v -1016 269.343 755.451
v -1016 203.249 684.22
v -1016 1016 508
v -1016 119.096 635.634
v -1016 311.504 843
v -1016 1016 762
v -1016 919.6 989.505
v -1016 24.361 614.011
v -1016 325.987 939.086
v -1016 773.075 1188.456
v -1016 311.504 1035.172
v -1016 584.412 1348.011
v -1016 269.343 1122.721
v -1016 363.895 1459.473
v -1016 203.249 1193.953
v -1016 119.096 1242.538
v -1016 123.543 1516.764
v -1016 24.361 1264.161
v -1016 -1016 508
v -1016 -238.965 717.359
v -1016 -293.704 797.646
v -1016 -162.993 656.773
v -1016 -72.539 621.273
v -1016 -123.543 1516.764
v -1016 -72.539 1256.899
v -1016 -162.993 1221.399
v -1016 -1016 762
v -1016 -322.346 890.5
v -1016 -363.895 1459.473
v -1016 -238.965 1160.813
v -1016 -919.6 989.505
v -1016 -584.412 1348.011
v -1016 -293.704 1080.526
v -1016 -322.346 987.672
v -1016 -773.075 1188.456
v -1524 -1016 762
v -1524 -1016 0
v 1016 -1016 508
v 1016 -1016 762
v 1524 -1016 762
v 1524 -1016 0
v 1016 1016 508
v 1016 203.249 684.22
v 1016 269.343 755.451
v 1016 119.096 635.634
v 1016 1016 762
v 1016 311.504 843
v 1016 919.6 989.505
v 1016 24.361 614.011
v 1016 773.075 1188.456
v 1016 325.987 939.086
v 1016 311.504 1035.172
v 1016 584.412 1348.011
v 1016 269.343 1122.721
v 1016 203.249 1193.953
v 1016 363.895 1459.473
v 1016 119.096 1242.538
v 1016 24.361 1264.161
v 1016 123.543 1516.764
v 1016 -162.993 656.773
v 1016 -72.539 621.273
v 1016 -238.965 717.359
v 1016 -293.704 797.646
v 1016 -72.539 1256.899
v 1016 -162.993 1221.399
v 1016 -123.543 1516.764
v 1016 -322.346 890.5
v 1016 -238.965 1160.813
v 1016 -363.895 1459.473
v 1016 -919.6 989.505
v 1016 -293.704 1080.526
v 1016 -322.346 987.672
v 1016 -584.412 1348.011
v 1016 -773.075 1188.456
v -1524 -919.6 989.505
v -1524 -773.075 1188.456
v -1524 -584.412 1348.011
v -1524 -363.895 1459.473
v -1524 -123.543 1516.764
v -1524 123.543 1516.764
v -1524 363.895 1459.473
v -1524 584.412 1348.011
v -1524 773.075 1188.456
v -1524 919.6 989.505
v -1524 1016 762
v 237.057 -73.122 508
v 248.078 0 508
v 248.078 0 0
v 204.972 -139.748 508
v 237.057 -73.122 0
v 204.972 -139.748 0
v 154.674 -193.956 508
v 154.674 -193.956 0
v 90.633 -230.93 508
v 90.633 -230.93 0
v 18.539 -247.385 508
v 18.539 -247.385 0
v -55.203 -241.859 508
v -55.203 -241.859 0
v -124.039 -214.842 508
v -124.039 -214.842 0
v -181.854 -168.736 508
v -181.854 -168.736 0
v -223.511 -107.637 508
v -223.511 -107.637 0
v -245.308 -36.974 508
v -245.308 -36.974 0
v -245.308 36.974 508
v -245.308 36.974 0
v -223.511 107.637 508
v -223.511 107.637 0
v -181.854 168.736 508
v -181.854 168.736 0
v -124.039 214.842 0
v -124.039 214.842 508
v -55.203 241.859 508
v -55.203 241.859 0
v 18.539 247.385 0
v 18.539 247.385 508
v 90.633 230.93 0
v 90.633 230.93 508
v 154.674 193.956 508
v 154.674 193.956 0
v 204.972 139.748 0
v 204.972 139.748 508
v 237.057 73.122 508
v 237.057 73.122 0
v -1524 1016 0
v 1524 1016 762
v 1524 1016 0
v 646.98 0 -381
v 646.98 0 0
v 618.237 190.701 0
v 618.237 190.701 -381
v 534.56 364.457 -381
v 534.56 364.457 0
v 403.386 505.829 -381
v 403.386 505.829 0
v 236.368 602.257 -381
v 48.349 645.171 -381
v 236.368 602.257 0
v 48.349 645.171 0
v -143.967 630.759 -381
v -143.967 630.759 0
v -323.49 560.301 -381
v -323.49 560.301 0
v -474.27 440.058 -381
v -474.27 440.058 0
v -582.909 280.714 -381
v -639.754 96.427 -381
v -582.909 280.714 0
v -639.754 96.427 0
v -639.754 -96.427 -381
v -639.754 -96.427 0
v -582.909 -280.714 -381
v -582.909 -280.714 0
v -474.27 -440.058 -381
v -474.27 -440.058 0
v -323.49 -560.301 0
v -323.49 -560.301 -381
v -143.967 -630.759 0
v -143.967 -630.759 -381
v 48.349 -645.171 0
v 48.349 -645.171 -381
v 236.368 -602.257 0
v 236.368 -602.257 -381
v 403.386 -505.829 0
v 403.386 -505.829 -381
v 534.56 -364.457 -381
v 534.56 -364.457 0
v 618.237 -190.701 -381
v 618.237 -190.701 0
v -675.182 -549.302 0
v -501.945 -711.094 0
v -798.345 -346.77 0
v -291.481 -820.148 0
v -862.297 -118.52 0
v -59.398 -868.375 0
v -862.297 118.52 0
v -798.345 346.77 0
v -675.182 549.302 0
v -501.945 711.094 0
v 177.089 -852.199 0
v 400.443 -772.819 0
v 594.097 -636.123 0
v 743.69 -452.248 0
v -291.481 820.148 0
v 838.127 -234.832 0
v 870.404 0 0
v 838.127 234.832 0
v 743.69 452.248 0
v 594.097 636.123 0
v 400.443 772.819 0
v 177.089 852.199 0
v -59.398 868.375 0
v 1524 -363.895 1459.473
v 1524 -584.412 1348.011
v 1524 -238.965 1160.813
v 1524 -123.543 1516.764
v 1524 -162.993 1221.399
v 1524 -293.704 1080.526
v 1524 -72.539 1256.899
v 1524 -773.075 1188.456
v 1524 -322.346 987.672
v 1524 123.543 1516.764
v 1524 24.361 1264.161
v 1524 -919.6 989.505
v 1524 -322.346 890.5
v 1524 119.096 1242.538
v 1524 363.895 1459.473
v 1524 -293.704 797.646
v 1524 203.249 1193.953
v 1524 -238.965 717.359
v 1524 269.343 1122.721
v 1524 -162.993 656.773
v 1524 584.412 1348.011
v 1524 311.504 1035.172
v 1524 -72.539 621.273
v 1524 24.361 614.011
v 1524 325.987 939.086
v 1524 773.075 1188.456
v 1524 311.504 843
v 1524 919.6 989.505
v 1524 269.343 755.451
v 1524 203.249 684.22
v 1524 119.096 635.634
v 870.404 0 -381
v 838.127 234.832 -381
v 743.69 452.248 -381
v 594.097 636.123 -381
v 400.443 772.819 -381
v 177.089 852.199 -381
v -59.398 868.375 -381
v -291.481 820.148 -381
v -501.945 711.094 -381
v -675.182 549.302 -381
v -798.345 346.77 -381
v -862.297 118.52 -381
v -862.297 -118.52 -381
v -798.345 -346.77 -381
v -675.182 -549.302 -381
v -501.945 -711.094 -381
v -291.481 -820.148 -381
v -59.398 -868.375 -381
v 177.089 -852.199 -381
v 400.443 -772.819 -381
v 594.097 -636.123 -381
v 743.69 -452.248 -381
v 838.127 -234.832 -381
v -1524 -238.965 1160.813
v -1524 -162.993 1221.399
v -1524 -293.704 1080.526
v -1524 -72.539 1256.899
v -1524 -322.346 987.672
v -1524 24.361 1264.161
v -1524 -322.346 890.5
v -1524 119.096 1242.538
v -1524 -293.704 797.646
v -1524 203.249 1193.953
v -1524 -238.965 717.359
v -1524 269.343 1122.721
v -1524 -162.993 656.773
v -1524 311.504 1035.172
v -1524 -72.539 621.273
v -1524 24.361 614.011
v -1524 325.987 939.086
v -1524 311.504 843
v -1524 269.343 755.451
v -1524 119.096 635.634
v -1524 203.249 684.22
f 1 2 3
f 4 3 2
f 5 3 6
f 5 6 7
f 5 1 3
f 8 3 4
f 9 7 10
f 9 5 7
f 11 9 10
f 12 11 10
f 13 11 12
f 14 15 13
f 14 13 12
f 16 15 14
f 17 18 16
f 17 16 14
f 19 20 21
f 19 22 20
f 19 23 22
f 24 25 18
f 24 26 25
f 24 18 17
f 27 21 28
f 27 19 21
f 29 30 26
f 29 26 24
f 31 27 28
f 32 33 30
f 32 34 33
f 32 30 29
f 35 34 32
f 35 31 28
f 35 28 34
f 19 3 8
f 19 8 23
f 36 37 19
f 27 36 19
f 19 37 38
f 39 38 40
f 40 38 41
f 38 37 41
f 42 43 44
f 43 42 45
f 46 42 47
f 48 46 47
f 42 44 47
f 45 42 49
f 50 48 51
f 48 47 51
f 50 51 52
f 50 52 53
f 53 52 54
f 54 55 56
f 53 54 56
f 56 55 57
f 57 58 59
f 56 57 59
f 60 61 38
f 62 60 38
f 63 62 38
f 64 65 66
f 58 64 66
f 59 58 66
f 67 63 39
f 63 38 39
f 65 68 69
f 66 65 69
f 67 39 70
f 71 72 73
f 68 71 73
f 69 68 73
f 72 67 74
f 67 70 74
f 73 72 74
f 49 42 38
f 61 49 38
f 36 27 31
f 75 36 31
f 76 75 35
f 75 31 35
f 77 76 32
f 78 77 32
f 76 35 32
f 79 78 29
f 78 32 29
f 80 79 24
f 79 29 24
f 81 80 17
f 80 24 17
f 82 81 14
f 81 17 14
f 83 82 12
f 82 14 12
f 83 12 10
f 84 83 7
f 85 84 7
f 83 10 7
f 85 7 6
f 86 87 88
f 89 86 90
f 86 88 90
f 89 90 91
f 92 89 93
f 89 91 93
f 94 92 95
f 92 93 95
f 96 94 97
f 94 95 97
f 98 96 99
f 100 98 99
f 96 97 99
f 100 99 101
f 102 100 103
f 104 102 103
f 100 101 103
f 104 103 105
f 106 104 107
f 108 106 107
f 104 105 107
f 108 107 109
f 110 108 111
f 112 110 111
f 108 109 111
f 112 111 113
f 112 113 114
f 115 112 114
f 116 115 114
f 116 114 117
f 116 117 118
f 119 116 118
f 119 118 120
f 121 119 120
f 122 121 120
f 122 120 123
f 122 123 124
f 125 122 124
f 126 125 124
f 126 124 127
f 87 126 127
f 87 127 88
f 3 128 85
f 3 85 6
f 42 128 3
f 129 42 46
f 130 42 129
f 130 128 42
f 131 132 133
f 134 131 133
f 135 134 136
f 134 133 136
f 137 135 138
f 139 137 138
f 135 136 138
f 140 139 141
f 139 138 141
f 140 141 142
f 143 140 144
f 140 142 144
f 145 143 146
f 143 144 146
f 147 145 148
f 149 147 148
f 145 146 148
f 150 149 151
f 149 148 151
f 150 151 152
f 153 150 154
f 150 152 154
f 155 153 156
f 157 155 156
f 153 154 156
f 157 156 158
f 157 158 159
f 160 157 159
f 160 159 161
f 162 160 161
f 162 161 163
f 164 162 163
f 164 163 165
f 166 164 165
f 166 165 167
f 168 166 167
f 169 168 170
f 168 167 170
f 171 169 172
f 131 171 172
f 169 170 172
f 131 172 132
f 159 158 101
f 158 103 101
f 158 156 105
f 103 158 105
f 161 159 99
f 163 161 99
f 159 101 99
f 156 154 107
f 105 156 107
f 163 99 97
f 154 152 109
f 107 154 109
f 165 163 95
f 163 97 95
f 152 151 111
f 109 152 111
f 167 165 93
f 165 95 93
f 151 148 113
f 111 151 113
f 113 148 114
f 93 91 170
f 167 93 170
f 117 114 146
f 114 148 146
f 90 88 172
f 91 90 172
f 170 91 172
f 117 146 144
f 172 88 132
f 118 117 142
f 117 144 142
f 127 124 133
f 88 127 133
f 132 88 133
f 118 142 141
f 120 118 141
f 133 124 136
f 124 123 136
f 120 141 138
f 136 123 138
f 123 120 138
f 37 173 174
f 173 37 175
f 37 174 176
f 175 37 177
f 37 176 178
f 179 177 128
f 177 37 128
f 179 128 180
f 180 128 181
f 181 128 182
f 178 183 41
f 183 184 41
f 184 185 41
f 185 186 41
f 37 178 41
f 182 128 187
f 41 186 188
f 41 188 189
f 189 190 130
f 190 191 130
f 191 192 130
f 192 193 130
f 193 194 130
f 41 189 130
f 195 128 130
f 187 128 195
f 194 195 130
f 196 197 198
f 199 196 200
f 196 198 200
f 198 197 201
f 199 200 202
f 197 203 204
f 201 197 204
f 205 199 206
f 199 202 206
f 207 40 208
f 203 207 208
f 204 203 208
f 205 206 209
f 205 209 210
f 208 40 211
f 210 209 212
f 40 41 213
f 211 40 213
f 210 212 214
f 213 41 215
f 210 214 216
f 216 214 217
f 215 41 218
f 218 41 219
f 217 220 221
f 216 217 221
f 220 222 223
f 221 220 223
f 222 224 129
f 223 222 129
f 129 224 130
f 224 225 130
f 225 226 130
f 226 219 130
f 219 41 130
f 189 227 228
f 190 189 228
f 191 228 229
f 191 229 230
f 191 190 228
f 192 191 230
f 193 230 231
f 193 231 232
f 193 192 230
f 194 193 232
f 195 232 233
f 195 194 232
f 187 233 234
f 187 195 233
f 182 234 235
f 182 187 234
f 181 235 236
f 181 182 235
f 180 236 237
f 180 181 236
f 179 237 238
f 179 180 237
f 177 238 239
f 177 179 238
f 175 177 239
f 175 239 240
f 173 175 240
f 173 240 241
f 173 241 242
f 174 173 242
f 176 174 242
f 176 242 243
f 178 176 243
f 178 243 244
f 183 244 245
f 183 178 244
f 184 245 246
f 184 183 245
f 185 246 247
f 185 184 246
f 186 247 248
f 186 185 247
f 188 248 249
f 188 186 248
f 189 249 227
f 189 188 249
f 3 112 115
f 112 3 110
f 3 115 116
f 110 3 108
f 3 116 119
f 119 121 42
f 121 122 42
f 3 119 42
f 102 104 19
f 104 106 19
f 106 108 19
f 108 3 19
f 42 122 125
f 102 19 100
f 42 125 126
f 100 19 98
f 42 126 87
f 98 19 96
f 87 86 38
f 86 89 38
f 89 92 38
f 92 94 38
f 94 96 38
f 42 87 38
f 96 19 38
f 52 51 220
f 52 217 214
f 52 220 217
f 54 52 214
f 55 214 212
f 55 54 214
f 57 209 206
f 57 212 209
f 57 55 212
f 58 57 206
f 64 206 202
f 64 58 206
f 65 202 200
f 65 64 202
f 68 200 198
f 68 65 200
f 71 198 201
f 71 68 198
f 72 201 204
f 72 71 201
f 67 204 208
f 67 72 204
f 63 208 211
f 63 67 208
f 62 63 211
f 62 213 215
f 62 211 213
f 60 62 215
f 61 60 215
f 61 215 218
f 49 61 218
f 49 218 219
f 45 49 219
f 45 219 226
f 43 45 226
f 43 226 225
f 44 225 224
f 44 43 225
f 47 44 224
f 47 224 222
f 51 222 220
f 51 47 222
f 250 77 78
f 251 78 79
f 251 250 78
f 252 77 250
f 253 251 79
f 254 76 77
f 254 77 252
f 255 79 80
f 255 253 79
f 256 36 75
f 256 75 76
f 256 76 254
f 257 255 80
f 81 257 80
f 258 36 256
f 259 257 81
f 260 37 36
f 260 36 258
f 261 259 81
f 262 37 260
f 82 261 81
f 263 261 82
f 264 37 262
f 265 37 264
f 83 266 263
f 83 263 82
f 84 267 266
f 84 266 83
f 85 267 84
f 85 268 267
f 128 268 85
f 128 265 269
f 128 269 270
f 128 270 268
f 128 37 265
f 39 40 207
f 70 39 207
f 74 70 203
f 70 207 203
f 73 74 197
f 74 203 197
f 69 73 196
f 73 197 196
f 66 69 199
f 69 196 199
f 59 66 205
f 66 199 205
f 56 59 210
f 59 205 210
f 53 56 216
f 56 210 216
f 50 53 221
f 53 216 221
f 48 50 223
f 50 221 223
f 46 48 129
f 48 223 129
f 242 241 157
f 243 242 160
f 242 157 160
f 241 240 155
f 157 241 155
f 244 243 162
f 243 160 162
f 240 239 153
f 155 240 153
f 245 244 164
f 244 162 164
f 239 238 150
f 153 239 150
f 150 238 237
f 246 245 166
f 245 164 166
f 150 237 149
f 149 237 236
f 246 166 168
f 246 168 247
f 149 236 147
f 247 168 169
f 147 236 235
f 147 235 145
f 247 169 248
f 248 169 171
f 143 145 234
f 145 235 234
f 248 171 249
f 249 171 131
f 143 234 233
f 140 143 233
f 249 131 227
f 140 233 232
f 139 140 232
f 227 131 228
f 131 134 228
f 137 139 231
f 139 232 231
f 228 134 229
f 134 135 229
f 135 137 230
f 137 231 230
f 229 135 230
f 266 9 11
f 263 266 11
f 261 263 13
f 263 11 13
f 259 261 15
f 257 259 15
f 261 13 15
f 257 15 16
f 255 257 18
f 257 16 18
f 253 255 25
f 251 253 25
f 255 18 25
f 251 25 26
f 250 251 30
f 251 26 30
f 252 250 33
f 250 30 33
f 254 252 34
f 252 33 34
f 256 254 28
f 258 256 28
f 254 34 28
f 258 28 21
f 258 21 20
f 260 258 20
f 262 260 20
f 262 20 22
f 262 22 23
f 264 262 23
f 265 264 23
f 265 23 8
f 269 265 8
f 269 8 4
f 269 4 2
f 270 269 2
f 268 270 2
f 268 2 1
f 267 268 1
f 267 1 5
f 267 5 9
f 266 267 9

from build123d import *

# Parameters (mm, degrees)
F0_W           = 3048
F0_H           = 2032
F1_DEPTH       = 1524
F3_DEPTH       = 3048.001
F5_W           = 2032
F5_H           = 1315.5198163623
F6_DEPTH       = 2133.601
F7_R           = 870.4042517591
F7_R_2         = 646.9801635048
F8_DEPTH       = 381
F9_R           = 248.0784284922
F10_DEPTH      = 1734.82
F11_R          = 325.9865562234
F12_DEPTH      = 1981.2
F12_DEPTH_BACK = 1854.2


with BuildPart() as f1:
    # F0 (on Top) → F1 (new body)
    with BuildSketch(Plane.XY):
        Rectangle(F0_W, F0_H)
    extrude(amount=F1_DEPTH)

    # F2 (on face) → F3 (cut, through all)
    with BuildSketch(Plane.YZ.offset(1524)):
        with BuildLine():
            ThreePointArc((7.186e-07, 1524), (635.0000002874, 1312.3333331178), (1016, 762))
            Line((1016, 762), (1016, 1524))
            Line((1016, 1524), (7.186e-07, 1524))
        make_face()
        with BuildLine():
            ThreePointArc((-1016, 762), (-634.9999997126, 1312.3333335489), (7.186e-07, 1524))
            Line((7.186e-07, 1524), (-1016, 1524))
            Line((-1016, 1524), (-1016, 762))
        make_face()
    extrude(amount=-F3_DEPTH, mode=Mode.SUBTRACT)

    # F5 (on offset) → F6 (cut, through all)
    with BuildSketch(Plane.XZ.offset(1117.6)):
        with Locations((0, 1165.7599081811)):
            Rectangle(F5_W, F5_H)
    extrude(amount=-F6_DEPTH, mode=Mode.SUBTRACT)

    # F7 (on Top) → F8 (join)
    with BuildSketch(Plane.XY):
        Circle(F7_R)
        Circle(F7_R_2, mode=Mode.SUBTRACT)
    extrude(amount=-F8_DEPTH)

    # F9 (on face) → F10 (cut)
    with BuildSketch(Plane(origin=(0, 0, 0), x_dir=(1, 0, 0), z_dir=(0, 0, -1))):
        Circle(F9_R)
    extrude(amount=-F10_DEPTH, mode=Mode.SUBTRACT)

    # F11 (on Right) → F12 (cut, two sides)
    with BuildSketch(Plane.YZ) as f12_sk:
        with Locations((0, 939.0860795975)):
            Circle(F11_R)
    extrude(amount=-F12_DEPTH, mode=Mode.SUBTRACT)
    extrude(f12_sk.sketch, amount=F12_DEPTH_BACK, mode=Mode.SUBTRACT)


solid = f1.part
